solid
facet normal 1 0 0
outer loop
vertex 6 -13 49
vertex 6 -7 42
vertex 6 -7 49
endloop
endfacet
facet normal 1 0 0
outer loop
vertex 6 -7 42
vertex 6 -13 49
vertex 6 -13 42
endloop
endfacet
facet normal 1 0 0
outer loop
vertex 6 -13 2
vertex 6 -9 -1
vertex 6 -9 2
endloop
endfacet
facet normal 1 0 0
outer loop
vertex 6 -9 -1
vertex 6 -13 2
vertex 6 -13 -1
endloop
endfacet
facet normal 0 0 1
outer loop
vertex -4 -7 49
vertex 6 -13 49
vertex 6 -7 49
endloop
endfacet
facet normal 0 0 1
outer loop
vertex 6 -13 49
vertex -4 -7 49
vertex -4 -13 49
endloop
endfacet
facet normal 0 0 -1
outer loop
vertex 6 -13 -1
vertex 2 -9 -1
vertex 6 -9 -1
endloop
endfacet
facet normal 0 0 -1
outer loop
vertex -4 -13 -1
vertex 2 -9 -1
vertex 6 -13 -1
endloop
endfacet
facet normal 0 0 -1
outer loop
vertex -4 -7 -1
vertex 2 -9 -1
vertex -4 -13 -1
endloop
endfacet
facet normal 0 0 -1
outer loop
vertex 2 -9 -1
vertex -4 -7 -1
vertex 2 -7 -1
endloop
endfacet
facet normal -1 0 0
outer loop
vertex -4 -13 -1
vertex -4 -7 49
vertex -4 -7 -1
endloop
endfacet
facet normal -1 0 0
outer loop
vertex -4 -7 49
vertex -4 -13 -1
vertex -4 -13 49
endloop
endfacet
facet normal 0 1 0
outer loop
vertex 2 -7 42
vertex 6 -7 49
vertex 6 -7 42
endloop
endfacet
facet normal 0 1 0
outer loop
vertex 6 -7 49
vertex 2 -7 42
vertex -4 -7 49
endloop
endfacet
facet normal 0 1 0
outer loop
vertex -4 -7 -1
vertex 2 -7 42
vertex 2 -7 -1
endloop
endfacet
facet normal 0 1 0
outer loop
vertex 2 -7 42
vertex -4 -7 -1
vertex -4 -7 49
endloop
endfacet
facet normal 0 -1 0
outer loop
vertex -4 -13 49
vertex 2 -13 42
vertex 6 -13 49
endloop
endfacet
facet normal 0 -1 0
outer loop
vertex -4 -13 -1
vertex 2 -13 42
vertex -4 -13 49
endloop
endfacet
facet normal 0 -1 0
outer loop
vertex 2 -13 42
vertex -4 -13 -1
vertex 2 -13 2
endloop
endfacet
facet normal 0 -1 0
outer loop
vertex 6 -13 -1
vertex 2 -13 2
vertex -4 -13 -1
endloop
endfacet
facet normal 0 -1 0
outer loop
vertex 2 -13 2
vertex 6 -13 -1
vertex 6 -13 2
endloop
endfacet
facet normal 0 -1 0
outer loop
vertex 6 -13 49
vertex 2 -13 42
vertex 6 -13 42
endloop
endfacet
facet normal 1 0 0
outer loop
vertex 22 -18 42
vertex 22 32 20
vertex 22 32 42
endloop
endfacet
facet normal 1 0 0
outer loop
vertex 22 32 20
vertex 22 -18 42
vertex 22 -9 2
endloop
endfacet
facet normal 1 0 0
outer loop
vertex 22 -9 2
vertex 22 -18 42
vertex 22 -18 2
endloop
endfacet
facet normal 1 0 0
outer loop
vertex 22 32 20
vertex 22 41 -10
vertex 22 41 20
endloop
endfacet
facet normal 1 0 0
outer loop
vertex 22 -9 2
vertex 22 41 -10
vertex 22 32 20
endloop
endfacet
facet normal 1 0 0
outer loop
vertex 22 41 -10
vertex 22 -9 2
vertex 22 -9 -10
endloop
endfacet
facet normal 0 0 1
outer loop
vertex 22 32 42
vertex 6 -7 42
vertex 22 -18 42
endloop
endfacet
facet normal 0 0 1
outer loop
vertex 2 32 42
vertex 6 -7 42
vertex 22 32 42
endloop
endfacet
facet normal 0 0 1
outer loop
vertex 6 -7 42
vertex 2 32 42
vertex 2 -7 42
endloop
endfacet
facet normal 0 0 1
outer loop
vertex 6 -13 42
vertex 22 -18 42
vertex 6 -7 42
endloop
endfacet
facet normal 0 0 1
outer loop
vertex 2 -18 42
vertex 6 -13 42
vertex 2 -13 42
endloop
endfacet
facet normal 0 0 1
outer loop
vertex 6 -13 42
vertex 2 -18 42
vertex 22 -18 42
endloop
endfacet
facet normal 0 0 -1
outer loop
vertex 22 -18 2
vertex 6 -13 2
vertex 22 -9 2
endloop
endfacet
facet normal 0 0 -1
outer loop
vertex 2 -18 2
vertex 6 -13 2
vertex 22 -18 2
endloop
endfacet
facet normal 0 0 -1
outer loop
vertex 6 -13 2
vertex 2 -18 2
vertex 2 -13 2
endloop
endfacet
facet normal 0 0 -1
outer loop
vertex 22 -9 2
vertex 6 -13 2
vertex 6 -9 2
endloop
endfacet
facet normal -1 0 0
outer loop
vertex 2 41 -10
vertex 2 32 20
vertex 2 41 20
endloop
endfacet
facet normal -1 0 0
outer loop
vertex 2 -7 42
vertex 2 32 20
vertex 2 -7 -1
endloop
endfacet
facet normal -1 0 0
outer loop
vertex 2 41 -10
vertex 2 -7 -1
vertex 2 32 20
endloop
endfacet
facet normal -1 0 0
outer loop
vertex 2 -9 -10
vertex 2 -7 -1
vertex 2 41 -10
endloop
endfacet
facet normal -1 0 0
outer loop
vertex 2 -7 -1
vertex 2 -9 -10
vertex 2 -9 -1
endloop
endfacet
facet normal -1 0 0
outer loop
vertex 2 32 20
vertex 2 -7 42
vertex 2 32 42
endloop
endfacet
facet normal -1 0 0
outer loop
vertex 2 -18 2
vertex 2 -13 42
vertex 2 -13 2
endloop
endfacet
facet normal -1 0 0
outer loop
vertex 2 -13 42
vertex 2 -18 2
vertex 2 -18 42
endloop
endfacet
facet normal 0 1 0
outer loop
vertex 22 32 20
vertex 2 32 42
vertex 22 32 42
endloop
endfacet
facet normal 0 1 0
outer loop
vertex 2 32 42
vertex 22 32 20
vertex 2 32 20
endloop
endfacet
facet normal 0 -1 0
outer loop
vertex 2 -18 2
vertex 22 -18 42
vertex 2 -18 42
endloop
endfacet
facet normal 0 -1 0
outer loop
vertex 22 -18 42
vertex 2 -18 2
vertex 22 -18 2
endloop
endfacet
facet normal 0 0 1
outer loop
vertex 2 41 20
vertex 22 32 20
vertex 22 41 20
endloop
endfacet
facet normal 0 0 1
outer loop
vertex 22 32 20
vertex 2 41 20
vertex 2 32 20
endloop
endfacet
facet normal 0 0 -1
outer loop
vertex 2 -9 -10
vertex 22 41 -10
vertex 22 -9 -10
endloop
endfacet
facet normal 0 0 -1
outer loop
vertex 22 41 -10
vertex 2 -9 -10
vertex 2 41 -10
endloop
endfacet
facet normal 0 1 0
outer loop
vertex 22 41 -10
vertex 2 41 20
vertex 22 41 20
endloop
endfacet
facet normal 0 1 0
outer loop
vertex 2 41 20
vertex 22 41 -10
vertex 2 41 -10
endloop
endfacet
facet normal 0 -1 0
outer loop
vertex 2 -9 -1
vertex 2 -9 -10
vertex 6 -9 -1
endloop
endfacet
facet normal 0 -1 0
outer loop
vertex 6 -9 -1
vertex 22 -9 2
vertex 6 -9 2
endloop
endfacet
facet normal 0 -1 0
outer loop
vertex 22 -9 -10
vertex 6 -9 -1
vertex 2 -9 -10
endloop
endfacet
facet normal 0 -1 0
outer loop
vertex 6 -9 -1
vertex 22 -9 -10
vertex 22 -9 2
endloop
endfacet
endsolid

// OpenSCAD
				group() {
					multmatrix([[1, 0, 0, 1], [0, 1, 0, -10], [0, 0, 1, 24], [0, 0, 0, 1]]) {
						cube(size = [10, 6, 50], center = true);
					}
					multmatrix([[1, 0, 0, 2], [0, 1, 0, -18], [0, 0, 1, 2], [0, 0, 0, 1]]) {
						cube(size = [20, 50, 40], center = false);
					}
					multmatrix([[1, 0, 0, 2], [0, 1, 0, -9], [0, 0, 1, -10], [0, 0, 0, 1]]) {
						cube(size = [20, 50, 30], center = false);
					}
				}
				
